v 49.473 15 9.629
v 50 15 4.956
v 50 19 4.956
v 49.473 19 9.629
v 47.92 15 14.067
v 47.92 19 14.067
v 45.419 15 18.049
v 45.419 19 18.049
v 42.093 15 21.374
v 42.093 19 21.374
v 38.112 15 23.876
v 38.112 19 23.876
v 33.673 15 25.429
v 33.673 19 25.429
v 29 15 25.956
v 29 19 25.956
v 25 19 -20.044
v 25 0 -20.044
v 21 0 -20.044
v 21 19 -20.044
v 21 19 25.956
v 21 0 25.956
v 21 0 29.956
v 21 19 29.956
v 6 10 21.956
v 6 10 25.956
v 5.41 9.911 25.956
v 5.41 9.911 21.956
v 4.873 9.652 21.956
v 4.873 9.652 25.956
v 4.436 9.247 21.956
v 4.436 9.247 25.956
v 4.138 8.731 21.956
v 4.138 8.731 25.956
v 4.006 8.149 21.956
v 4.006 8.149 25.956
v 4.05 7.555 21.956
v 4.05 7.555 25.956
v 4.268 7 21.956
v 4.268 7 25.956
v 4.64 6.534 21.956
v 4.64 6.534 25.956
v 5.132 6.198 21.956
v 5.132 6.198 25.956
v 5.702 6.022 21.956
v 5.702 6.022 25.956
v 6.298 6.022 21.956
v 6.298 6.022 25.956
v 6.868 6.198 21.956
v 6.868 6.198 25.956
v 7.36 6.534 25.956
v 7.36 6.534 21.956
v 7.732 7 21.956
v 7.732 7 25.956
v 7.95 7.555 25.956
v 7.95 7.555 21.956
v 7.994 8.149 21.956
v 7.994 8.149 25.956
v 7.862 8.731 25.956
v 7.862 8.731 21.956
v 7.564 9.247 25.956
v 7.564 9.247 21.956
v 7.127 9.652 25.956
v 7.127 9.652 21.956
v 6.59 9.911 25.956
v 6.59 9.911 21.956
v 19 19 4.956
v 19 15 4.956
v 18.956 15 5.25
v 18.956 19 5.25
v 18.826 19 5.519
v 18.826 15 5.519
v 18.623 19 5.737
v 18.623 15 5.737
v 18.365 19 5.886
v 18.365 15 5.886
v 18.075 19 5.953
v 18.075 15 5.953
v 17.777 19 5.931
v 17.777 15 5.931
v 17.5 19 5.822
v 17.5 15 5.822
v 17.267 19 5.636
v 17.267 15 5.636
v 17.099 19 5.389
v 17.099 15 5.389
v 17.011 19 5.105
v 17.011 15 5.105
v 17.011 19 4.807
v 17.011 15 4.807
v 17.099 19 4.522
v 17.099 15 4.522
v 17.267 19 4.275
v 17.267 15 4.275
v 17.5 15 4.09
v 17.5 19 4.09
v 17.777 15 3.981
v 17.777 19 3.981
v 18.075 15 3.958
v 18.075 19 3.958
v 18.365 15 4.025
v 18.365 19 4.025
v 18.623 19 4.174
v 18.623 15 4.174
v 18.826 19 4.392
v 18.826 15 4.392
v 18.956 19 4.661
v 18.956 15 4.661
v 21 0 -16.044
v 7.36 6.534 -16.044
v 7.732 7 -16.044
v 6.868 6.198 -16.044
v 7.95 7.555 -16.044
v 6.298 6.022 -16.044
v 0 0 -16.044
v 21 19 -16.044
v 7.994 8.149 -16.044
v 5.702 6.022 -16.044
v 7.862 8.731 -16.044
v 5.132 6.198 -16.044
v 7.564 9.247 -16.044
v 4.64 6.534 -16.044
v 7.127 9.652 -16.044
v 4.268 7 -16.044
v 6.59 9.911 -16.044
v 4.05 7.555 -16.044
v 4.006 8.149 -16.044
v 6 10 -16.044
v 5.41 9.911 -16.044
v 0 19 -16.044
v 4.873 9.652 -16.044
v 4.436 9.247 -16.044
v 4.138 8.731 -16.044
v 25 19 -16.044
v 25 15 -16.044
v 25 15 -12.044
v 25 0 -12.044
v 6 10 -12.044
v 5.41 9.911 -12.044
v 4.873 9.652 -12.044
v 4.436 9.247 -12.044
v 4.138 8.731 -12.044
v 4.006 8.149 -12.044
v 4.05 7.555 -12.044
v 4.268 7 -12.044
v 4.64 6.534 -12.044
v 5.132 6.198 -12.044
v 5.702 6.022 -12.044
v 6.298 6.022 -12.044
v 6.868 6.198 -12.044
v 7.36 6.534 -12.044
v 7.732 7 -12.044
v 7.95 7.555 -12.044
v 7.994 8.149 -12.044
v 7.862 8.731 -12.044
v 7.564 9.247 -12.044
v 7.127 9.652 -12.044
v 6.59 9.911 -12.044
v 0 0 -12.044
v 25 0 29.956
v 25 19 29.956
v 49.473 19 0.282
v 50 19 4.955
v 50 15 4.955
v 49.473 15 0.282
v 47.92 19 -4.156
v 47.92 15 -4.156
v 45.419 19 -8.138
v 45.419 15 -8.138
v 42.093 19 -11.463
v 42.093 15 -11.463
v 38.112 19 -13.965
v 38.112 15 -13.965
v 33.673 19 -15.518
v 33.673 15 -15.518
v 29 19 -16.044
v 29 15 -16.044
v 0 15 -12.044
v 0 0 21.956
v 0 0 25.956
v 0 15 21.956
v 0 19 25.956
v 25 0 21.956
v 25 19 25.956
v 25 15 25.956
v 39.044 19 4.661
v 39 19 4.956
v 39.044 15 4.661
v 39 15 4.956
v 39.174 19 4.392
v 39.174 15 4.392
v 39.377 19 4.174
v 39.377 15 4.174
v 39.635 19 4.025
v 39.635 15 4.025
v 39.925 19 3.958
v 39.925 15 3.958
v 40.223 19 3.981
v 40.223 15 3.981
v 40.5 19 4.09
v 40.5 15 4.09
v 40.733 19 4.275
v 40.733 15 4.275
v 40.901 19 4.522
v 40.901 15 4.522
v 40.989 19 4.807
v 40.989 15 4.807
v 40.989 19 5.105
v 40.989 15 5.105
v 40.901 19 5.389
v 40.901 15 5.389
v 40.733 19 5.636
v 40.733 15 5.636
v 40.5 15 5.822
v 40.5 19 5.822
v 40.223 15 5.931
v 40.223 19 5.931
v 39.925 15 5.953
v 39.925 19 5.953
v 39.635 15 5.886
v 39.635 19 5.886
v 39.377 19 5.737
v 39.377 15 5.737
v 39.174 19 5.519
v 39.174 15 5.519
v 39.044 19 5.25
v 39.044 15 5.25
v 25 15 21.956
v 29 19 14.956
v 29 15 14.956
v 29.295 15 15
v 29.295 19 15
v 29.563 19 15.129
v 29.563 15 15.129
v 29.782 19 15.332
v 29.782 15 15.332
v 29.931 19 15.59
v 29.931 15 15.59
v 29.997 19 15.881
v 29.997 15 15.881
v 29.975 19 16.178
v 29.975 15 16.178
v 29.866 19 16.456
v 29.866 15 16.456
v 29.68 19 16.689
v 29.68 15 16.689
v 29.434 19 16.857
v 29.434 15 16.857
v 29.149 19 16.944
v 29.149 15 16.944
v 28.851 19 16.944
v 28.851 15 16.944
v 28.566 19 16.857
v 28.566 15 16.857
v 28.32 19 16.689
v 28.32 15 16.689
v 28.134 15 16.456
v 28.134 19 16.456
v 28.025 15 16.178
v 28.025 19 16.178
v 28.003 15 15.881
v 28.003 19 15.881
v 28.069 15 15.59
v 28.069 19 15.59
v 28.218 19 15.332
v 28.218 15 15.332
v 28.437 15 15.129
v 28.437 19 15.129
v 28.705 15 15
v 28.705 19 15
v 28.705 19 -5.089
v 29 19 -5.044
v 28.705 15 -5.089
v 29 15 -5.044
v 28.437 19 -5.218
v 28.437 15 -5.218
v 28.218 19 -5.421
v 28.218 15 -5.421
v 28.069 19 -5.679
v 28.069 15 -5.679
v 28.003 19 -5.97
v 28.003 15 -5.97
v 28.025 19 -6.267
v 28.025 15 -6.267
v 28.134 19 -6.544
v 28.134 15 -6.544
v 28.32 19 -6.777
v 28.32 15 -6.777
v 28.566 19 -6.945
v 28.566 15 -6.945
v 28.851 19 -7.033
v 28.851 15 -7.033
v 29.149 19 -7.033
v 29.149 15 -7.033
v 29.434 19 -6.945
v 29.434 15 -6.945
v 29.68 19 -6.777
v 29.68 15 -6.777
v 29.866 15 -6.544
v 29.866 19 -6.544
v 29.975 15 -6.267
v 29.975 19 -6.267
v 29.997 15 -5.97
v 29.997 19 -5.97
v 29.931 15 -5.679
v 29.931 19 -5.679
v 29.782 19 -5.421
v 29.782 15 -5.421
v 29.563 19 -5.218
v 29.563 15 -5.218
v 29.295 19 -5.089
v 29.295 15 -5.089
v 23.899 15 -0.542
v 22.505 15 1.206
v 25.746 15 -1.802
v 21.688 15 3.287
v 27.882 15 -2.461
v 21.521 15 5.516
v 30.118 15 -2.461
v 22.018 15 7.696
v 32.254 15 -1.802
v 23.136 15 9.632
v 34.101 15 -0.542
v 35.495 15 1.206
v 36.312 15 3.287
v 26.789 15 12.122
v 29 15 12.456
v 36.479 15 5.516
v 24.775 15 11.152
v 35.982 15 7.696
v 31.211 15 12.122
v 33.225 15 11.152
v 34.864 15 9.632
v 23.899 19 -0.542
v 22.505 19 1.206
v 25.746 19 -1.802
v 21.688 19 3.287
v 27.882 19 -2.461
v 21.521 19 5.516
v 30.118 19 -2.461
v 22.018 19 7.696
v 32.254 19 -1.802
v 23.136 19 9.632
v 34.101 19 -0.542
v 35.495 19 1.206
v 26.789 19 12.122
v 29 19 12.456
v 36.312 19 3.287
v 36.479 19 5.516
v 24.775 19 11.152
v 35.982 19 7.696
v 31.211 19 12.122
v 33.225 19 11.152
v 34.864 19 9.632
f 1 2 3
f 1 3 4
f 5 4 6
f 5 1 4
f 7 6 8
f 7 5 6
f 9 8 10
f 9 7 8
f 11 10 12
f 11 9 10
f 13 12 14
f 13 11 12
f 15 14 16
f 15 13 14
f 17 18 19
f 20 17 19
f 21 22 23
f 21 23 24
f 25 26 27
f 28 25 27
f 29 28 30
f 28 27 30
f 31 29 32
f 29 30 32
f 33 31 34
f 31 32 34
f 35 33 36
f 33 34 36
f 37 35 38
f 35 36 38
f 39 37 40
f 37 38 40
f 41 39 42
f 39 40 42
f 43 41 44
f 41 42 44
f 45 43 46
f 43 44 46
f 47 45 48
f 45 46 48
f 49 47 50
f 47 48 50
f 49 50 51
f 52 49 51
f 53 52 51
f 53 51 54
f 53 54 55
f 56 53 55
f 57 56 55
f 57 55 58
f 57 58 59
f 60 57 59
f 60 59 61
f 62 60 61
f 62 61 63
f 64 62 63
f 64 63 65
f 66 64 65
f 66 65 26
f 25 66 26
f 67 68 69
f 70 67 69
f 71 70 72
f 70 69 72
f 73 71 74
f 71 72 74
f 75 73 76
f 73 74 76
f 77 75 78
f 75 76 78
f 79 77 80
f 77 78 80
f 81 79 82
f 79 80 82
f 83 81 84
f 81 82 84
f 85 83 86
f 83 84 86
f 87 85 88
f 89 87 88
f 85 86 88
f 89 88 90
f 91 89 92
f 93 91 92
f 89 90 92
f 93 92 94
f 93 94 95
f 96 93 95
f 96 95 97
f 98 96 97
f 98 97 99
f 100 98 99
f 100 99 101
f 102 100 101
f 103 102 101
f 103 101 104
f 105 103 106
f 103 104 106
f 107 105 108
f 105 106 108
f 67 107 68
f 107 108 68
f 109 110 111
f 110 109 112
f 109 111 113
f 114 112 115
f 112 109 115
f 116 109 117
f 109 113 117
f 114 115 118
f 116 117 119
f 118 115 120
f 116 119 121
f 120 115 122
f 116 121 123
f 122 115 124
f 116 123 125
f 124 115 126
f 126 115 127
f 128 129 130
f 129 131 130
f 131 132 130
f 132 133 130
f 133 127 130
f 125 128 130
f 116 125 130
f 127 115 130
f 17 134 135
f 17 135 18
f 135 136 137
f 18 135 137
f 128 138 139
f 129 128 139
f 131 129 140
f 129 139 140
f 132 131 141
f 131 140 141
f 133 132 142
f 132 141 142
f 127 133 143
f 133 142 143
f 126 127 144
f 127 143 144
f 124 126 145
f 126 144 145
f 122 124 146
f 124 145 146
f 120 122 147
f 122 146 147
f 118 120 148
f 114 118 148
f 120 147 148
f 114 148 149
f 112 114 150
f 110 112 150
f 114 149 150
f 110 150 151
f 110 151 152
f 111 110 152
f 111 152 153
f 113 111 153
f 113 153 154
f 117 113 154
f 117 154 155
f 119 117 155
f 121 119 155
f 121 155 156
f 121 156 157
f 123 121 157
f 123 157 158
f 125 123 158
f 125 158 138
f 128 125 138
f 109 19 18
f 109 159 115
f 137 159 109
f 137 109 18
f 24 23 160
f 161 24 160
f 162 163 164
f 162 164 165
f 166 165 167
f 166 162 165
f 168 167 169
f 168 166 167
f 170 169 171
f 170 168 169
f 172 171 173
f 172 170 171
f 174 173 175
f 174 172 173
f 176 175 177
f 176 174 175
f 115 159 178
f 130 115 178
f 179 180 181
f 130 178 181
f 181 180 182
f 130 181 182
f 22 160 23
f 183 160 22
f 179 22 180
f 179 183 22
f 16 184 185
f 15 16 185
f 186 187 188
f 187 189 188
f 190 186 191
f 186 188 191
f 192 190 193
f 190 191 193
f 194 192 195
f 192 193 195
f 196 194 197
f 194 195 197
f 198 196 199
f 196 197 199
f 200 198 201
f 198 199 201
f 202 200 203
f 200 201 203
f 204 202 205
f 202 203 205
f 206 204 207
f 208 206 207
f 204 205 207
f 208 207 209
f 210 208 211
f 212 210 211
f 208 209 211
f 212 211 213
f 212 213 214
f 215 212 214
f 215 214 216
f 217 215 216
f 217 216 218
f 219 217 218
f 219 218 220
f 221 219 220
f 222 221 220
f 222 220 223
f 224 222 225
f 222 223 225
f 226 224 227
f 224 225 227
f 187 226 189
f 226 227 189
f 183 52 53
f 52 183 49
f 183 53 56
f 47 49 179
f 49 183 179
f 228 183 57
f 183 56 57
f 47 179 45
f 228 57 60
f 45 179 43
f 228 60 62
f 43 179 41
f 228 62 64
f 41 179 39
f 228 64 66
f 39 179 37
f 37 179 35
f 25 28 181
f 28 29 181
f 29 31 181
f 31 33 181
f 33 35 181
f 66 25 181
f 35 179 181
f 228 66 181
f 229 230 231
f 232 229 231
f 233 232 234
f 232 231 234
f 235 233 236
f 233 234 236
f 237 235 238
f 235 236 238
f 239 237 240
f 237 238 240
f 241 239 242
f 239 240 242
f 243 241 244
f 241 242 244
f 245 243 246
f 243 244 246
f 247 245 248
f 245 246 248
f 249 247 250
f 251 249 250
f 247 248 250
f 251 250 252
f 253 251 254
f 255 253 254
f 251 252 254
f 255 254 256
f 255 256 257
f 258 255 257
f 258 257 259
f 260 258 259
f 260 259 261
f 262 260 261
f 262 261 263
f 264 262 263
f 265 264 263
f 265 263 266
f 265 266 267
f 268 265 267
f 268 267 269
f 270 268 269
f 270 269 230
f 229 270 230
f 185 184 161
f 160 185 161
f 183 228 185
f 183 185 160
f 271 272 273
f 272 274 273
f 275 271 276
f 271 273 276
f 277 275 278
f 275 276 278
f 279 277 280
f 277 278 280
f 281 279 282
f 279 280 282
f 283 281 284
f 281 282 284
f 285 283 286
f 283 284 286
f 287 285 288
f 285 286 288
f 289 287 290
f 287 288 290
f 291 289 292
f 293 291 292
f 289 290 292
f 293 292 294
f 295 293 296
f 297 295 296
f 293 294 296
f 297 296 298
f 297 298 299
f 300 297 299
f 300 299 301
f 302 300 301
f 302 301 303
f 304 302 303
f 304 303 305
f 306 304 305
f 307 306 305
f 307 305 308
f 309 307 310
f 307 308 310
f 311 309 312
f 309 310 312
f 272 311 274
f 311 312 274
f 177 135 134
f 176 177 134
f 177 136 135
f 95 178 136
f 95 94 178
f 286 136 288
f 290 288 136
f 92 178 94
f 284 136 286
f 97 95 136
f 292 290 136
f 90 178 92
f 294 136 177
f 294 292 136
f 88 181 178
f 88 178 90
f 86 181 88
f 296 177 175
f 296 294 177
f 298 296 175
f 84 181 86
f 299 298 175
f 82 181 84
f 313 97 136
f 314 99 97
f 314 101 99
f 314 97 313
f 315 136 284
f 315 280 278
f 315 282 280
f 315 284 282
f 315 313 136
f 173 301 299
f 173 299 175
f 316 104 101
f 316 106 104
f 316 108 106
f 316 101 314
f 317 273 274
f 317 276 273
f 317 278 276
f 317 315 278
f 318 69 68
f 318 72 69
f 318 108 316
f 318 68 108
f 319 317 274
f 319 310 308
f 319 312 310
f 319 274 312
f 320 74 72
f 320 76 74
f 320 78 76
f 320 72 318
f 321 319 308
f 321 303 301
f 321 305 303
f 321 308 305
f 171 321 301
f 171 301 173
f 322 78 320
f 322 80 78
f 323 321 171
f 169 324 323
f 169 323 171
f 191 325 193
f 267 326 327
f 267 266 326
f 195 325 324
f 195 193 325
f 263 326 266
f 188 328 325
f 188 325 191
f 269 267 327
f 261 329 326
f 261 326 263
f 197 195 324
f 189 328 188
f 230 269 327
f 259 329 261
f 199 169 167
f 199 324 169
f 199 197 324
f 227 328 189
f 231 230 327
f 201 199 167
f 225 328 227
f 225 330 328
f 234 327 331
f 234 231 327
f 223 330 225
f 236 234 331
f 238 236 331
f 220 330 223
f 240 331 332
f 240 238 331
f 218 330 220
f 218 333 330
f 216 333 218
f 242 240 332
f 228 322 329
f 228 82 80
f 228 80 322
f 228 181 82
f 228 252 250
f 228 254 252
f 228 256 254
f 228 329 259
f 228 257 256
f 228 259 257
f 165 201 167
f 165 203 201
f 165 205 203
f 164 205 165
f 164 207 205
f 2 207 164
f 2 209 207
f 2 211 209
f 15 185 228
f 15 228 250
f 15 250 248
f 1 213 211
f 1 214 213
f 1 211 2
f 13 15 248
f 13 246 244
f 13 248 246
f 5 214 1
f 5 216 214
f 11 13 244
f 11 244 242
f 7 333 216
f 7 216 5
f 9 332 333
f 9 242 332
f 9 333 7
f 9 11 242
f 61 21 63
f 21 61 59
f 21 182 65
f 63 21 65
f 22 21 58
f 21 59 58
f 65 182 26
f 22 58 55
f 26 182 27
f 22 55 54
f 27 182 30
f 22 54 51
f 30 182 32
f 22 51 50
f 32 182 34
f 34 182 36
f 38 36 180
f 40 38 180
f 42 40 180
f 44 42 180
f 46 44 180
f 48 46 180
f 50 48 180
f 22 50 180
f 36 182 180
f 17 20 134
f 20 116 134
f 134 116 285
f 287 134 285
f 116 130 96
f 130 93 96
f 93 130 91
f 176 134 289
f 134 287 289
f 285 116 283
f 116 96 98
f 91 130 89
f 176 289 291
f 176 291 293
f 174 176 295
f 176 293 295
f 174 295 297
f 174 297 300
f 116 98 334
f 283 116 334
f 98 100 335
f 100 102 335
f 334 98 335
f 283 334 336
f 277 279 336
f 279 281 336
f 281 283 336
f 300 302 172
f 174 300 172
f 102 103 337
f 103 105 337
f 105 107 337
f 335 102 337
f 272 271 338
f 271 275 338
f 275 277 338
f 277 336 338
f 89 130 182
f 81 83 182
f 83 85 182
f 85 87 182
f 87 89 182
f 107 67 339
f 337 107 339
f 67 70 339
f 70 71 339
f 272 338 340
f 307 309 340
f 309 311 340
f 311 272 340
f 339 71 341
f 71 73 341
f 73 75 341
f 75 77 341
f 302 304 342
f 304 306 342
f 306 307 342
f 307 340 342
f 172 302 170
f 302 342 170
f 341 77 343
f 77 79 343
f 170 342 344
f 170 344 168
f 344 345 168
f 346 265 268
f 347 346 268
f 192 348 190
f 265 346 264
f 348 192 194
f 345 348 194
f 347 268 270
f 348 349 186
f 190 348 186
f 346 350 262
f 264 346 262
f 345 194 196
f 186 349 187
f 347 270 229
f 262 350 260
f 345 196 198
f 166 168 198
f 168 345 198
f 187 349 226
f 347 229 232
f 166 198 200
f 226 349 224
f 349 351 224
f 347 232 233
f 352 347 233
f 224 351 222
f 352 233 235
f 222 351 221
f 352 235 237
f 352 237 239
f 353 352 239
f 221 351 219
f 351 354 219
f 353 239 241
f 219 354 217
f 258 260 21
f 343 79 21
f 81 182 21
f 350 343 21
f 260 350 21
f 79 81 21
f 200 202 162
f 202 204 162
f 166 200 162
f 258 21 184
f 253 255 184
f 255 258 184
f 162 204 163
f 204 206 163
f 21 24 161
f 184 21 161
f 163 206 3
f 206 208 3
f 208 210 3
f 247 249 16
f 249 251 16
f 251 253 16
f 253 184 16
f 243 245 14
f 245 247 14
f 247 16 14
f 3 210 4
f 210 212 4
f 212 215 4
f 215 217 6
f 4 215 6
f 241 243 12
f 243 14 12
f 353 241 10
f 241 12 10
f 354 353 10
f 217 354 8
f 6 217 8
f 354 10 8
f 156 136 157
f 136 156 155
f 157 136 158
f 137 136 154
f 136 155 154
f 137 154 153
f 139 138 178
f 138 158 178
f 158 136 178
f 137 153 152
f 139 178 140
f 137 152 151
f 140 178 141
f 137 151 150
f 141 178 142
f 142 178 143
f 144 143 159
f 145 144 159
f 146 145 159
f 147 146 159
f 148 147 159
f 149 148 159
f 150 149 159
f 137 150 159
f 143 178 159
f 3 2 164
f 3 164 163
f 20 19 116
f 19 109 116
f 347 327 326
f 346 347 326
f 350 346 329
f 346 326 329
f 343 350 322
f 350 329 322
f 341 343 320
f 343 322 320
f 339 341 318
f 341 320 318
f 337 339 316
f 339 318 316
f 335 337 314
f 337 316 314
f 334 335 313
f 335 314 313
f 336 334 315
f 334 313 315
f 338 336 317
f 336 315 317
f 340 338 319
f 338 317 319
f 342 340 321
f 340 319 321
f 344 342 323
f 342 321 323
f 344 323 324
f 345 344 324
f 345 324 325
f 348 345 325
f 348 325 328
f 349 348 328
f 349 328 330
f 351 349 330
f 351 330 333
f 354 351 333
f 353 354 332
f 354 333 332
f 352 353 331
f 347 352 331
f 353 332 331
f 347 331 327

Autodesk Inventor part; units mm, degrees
ref_plane "YZ Plane" through (0, 0, 0) normal (1, 0, 0) x (0, 1, 0)
ref_plane "XZ Plane" through (0, 0, 0) normal (0, 1, 0) x (-1, 0, 0)
ref_plane "XY Plane" through (0, 0, 0) normal (0, 0, 1) x (1, 0, 0)
sketch "Sketch1" plane through (0, 0, 0) normal (1, 0, 0) x (0, 1, 0)
  line L0 (0, 25.9556) -> (0, 21.9556)
  line L1 (0, 21.9556) -> (15, 21.9556)
  line L2 (15, 21.9556) -> (15, -12.0444)
  line L3 (15, -12.0444) -> (0, -12.0444)
  line L4 (0, -12.0444) -> (0, -16.0444)
  line L5 (0, -16.0444) -> (19, -16.0444)
  line L6 (19, -16.0444) -> (19, 25.9556)
  line L7 (19, 25.9556) -> (0, 25.9556)
  point P0 (0, 0)
  dimension "d0" = 4
  dimension "d1" = 4
  dimension "d2" = 15
  dimension "d3" = 42
extrude "Extrusion1" add sketch "Sketch1" along normal blind 50
sketch "Sketch2" plane through (0, 0, 25.9556) normal (0, 0, 1) x (1, 0, 0)
  line L0 (50, 0) -> (25, 0)
  line L1 (25, 0) -> (25, 15)
  line L2 (25, 15) -> (50, 15)
  line L3 (50, 15) -> (50, 0)
  point P0 (0, 0)
  dimension "d6" = 15
  dimension "d7" = 25
extrude "Extrusion2" cut sketch "Sketch2" against normal blind 50
fillet "Fillet1" radius 21 2 edges at (50, 17, 25.9556) (50, 17, -16.0444)
hole "Hole1" at (29, 19, 4.9556) direction (0, -1, 0) diameter 15 depth 8 tip angle 118
hole "Hole2" at (29, 19, -6.0444) direction (0, -1, 0) diameter 2 depth 8 tip angle 118
hole "Hole6" at (6, 8, -16.0444) direction (0, 0, 1) diameter 4 depth 42
pattern_circular "Circular Pattern1" count 4 over 360 about axis through (29, 15, 4.9556) along (0, 1, 0) of "Hole2"
sketch "Sketch3" plane through (0, 0, 25.9556) normal (0, 0, 1) x (1, 0, 0)
  line L0 (25, 15) -> (25, 0) projected
  line L1 (0, 19) -> (29, 19) projected
  line L2 (25, 0) -> (21, 0)
  line L3 (21, 0) -> (21, 19)
  line L4 (21, 19) -> (25, 19)
  line L5 (25, 19) -> (25, 0)
  point P0 (0, 0)
  dimension "d68" = 4
extrude "Extrusion3" add sketch "Sketch3" along normal blind 4
sketch "Sketch4" plane through (0, 0, -16.0444) normal (0, 0, -1) x (-1, 0, 0)
  line L0 (0, 0) -> (-25, 0) projected
  line L1 (0, 19) -> (-21, 19) projected
  line L2 (-25, 0) -> (-21, 0)
  line L3 (-21, 0) -> (-21, 19)
  line L4 (-21, 19) -> (-25, 19)
  line L5 (-25, 19) -> (-25, 0)
  dimension "d73" = 4
extrude "Extrusion4" add sketch "Sketch4" along normal blind 4
properties part number "BaseJointMotorMount"
